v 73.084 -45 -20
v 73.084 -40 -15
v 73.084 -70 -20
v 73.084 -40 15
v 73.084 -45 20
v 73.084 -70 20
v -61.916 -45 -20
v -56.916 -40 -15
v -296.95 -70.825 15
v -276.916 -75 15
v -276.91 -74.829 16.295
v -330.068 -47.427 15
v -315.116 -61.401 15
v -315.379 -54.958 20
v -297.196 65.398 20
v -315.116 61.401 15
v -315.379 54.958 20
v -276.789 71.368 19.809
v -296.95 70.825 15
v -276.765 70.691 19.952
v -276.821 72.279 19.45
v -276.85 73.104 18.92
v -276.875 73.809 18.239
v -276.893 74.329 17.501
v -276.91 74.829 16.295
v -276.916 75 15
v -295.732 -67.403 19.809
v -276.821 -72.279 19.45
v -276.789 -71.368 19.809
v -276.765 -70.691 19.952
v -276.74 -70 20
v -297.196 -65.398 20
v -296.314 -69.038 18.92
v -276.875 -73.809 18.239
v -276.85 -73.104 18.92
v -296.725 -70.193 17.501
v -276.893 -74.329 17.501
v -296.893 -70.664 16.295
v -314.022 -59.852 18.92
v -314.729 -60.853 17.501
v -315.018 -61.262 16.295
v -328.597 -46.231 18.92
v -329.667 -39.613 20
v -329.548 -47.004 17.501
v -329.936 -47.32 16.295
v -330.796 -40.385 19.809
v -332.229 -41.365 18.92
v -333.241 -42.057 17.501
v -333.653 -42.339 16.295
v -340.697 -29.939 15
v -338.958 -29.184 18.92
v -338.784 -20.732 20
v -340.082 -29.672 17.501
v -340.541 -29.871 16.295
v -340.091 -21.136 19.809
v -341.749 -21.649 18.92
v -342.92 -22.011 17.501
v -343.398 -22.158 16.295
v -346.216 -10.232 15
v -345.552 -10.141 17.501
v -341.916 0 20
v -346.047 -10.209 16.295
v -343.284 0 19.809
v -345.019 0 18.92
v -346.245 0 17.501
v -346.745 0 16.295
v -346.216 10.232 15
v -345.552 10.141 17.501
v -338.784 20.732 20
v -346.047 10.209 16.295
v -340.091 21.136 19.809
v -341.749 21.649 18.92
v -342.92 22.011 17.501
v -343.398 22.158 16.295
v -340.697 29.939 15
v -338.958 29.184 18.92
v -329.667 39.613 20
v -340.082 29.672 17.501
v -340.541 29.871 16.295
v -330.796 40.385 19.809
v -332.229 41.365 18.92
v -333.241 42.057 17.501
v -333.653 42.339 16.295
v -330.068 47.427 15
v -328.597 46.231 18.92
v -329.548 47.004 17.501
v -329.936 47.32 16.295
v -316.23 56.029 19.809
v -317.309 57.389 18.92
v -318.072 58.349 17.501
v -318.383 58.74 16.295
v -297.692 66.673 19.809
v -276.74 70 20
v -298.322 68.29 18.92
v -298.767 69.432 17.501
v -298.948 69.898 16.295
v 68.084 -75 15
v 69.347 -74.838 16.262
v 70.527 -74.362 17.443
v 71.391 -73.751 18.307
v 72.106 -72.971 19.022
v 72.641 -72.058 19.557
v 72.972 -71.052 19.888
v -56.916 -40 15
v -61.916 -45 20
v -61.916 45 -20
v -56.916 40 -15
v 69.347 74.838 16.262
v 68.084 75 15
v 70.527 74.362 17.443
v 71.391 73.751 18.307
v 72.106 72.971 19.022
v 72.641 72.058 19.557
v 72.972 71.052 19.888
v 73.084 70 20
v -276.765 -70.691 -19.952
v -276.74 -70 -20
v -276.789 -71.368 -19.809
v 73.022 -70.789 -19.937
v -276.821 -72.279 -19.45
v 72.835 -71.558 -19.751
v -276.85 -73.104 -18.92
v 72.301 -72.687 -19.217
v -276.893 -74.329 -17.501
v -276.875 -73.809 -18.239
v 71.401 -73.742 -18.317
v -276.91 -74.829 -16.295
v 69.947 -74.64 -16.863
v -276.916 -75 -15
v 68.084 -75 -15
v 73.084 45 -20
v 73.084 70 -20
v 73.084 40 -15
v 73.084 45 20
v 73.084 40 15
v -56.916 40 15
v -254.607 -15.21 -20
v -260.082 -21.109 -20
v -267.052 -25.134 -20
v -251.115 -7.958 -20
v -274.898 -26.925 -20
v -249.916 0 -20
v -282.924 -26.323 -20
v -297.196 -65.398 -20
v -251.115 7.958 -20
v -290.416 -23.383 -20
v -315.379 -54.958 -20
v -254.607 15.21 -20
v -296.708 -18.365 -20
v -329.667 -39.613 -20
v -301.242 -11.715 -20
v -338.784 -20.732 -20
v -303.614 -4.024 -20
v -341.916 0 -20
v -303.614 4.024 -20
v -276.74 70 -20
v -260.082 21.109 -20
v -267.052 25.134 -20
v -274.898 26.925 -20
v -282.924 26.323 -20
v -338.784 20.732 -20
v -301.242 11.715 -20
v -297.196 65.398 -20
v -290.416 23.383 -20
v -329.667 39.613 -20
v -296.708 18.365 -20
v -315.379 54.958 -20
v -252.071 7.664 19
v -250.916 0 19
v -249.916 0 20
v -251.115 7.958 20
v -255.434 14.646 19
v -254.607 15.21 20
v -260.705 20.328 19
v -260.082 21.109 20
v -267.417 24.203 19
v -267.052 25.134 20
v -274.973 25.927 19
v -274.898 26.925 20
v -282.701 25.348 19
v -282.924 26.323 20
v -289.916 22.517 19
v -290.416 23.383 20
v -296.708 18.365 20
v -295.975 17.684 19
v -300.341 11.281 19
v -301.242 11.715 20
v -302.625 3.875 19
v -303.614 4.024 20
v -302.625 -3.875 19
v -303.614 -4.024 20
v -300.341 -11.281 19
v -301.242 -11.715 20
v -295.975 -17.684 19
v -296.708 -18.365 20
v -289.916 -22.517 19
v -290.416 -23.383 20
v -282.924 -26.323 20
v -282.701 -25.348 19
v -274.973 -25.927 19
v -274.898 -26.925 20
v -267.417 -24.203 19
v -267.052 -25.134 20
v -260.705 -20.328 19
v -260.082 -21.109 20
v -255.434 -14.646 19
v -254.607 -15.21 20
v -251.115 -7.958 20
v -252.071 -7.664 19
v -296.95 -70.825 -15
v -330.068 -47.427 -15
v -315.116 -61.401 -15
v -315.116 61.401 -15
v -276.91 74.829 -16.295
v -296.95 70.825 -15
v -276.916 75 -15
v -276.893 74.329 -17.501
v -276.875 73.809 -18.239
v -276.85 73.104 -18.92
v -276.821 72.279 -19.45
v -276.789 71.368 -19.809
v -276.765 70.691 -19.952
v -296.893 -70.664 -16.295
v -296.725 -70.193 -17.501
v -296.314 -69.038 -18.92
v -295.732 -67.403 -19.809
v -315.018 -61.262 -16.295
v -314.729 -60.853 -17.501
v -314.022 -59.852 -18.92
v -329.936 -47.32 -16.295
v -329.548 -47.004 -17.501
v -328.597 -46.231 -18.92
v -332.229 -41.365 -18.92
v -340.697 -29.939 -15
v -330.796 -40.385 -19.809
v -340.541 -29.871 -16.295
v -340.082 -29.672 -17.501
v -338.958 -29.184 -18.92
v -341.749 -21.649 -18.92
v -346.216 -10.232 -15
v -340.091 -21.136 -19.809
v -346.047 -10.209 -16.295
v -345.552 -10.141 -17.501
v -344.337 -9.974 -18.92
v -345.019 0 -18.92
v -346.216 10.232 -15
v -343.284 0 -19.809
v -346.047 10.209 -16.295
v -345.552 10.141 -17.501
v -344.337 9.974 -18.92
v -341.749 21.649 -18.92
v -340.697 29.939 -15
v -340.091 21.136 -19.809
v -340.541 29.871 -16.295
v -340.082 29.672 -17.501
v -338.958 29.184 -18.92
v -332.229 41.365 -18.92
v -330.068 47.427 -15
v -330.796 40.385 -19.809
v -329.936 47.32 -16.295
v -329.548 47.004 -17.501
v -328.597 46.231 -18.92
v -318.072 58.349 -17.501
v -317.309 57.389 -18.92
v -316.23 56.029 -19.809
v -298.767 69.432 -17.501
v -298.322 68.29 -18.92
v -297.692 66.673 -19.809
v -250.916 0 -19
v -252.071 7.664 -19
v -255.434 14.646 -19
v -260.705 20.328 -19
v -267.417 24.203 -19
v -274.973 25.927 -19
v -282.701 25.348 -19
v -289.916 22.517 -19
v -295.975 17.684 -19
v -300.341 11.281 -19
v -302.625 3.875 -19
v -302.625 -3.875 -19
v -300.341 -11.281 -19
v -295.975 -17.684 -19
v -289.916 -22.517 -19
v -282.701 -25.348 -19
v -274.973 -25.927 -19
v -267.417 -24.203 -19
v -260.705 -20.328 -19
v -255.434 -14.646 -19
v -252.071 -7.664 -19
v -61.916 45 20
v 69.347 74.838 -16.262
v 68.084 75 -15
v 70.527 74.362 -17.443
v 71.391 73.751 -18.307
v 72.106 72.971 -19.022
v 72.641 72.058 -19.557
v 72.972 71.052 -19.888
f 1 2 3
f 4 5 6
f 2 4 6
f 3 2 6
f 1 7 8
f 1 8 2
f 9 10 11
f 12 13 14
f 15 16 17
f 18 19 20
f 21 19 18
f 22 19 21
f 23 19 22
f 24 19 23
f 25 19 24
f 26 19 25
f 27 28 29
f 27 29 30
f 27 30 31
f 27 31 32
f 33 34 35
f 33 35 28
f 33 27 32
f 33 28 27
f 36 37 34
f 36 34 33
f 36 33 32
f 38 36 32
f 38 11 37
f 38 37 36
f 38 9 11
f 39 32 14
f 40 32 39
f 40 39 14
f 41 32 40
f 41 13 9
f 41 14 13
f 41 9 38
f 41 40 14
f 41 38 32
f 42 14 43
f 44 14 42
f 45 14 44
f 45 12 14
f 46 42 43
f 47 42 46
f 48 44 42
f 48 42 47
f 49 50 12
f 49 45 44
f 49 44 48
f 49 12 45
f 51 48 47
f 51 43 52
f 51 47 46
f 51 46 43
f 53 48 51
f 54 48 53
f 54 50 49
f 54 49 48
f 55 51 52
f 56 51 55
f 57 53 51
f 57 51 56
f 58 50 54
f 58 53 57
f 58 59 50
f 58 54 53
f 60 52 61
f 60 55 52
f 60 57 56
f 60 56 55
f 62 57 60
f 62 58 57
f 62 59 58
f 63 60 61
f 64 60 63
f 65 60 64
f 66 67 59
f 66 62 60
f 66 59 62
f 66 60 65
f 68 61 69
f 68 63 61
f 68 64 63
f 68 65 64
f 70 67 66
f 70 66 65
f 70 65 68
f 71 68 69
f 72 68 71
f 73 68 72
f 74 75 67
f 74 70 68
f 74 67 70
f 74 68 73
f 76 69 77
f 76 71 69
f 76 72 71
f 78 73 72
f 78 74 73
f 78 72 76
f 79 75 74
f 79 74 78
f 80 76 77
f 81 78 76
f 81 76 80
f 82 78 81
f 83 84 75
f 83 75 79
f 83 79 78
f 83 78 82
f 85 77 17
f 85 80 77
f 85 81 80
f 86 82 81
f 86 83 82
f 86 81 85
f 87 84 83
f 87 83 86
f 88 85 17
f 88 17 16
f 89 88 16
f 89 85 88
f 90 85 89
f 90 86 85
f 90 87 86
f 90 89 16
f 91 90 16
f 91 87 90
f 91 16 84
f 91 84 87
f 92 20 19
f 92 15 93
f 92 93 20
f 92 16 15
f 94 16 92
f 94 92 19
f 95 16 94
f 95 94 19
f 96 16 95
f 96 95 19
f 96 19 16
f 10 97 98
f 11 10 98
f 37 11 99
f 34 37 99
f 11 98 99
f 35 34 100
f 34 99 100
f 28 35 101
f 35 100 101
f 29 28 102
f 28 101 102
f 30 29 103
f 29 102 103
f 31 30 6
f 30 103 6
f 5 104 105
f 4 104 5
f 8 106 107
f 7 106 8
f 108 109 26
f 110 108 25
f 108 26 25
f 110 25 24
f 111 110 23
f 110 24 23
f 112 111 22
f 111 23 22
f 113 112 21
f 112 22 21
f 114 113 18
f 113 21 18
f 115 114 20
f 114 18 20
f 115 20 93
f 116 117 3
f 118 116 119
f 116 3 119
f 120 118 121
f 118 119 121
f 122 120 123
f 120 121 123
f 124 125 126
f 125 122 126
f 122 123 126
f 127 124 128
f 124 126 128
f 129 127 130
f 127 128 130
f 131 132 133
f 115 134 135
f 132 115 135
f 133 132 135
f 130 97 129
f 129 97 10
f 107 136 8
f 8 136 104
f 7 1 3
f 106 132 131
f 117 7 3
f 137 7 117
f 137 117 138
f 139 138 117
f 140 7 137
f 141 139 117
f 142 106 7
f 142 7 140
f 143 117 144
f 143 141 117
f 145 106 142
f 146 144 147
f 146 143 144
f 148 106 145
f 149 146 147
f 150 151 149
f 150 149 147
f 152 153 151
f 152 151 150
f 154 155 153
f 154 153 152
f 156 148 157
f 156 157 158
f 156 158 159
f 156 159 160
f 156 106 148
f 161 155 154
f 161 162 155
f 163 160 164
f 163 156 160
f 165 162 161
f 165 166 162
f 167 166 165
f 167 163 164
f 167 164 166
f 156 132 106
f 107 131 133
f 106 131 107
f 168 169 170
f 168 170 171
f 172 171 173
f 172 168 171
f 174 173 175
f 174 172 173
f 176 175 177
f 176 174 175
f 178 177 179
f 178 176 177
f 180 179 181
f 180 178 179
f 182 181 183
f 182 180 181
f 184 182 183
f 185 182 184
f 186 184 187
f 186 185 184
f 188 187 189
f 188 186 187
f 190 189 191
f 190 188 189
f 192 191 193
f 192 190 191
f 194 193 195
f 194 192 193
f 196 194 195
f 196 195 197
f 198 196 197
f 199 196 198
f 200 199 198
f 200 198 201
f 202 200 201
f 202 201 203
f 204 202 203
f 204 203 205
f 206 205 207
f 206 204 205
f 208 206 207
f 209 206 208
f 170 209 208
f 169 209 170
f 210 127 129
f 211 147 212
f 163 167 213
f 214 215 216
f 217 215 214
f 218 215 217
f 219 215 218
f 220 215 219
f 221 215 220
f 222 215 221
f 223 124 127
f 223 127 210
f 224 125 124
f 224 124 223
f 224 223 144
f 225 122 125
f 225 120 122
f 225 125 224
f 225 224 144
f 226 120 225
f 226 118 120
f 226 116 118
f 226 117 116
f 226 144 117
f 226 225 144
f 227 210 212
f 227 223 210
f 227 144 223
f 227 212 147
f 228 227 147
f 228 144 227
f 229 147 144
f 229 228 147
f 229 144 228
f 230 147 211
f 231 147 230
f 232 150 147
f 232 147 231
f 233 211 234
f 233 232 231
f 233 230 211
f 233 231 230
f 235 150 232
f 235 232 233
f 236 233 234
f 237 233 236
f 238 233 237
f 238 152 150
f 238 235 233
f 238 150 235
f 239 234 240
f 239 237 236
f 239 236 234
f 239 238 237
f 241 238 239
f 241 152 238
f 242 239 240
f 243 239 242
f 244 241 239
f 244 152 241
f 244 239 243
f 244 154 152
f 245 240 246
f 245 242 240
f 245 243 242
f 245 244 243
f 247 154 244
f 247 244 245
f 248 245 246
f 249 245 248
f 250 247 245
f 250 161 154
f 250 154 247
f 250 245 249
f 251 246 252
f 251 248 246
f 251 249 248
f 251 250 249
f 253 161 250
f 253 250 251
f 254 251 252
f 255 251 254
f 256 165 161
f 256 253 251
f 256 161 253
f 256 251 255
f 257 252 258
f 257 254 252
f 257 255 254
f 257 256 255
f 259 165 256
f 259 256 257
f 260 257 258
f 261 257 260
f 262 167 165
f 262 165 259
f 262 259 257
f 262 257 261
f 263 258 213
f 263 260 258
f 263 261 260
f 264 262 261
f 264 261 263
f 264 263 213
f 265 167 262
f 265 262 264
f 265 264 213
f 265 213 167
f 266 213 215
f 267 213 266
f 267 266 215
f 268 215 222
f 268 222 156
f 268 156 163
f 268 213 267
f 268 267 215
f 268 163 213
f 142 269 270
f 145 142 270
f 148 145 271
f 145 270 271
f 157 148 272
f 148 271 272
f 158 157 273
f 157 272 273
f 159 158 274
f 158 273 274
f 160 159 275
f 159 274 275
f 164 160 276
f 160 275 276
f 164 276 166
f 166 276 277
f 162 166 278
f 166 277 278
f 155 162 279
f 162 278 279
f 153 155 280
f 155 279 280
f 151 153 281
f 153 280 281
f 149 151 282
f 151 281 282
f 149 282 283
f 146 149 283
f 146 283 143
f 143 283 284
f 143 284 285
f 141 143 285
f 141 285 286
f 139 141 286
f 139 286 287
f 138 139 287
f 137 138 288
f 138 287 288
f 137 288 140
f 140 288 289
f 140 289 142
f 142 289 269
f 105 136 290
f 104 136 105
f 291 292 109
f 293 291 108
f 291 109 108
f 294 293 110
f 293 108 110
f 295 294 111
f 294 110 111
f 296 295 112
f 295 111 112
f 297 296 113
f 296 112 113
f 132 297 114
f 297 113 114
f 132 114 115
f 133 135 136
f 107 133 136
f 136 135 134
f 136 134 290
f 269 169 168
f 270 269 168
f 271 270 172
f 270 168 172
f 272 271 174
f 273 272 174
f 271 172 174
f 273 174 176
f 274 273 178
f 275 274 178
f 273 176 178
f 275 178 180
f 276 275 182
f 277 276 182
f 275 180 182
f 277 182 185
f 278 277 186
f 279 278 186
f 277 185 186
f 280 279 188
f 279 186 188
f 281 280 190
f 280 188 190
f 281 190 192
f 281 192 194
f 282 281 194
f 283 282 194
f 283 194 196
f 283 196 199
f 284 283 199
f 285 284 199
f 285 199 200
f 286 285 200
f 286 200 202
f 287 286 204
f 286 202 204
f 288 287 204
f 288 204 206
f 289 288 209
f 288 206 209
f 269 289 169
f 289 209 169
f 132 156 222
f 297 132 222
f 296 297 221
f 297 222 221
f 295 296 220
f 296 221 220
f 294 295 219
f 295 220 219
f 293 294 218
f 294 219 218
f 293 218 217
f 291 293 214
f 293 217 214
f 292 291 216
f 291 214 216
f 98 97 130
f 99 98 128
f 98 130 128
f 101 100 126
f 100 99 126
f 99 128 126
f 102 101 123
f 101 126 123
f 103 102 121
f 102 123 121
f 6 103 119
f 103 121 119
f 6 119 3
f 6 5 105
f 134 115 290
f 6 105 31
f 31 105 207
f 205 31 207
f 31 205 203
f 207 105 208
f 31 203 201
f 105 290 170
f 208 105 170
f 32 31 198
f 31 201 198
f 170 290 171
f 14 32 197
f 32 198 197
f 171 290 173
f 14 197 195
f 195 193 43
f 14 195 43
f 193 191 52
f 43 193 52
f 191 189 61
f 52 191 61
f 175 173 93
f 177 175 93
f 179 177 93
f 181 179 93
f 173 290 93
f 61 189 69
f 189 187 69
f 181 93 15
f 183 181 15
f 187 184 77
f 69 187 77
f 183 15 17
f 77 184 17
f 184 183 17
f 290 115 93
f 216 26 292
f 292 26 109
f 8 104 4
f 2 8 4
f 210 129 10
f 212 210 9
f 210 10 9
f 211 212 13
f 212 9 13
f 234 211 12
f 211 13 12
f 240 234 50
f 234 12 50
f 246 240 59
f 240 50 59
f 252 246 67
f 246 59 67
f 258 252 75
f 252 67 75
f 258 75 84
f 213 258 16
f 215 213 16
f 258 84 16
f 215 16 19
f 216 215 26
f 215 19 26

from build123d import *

# Parameters (mm, degrees)
BOSS_EXTRUDE1_DEPTH = 20
SKETCH2_R           = 26
CUT_EXTRUDE1_DEPTH  = 40
FILLET1_R           = 5
CHAMFER1_SIZE       = 1
CHAMFER2_SIZE       = 5


with BuildPart() as part:
    # Sketch1 → Boss-Extrude1 (new, symmetric)
    with BuildSketch(Plane.XY):
        with BuildLine():
            Line((-276.915792692, 75), (73.084207308, 75))
            Line((73.084207308, 75), (73.084207308, 40))
            Line((73.084207308, 40), (-56.915792692, 40))
            Line((-56.915792692, 40), (-56.915792692, -40))
            Line((-56.915792692, -40), (73.084207308, -40))
            Line((73.084207308, -40), (73.084207308, -75))
            Line((73.084207308, -75), (-276.915792692, -75))
            ThreePointArc((-276.915792692, -75), (-346.915792692, 0), (-276.915792692, 75))
        make_face()
    extrude(amount=BOSS_EXTRUDE1_DEPTH, both=True)

    # Sketch2 → Cut-Extrude1 (cut)
    with BuildSketch(Plane.XY.offset(20)):
        with Locations((-276.915792692, 0)):
            Circle(SKETCH2_R)
    extrude(amount=-CUT_EXTRUDE1_DEPTH, mode=Mode.SUBTRACT)

    # Fillet1
    # the kernel refuses this fillet: 5 mm, written as the material it takes off along each edge
    with BuildSketch(Plane(origin=(78.084207308, -75, -20), x_dir=(0, 1, 0), z_dir=(-1, 0, 0)), Plane(origin=(-281.915792692, 75, 20), x_dir=(0, 0, -1), z_dir=(1, 0, 0))) as fillet1_piece_1:
        with BuildLine():
            CenterArc((FILLET1_R, -FILLET1_R), FILLET1_R, 90, 90)
            Line((0, -FILLET1_R), (-FILLET1_R * 0.02, -FILLET1_R))
            Line((-FILLET1_R * 0.02, -FILLET1_R), (-FILLET1_R * 0.02, FILLET1_R * 0.02))
            Line((-FILLET1_R * 0.02, FILLET1_R * 0.02), (FILLET1_R, FILLET1_R * 0.02))
            Line((FILLET1_R, FILLET1_R * 0.02), (FILLET1_R, 0))
        make_face()
    extrude(amount=360, mode=Mode.SUBTRACT)
    with BuildSketch(Plane(origin=(-271.737221263, 0, -20), x_dir=(-0.00233212005306246, -0.9999972806043315, 0), z_dir=(0.9999972806043315, -0.00233212005306246, 0))) as fillet1_piece_2:
        with BuildLine():
            CenterArc((75.178571429 - FILLET1_R, -FILLET1_R), FILLET1_R, 0, 90)
            Line((75.178571429 - FILLET1_R, 0), (75.178571429 - FILLET1_R, FILLET1_R * 0.02))
            Line((75.178571429 - FILLET1_R, FILLET1_R * 0.02), (75.178571429 + FILLET1_R * 0.02, FILLET1_R * 0.02))
            Line((75.178571429 + FILLET1_R * 0.02, FILLET1_R * 0.02), (75.178571429 + FILLET1_R * 0.02, -FILLET1_R))
            Line((75.178571429 + FILLET1_R * 0.02, -FILLET1_R), (75.178571429, -FILLET1_R))
        make_face()
    revolve(axis=Axis((-271.737221263, 0, -20), (0, 0, -1)), revolution_arc=179.732758485, mode=Mode.SUBTRACT)
    with BuildSketch(Plane(origin=(73.084207308, 75, 25), x_dir=(-1, 0, 0), z_dir=(0, 0, -1)), Plane(origin=(73.084207308, -75, -25), x_dir=(-1, 0, 0), z_dir=(0, 0, 1))) as fillet1_piece_3:
        with BuildLine():
            CenterArc((FILLET1_R, -FILLET1_R), FILLET1_R, 90, 90)
            Line((0, -FILLET1_R), (-FILLET1_R * 0.02, -FILLET1_R))
            Line((-FILLET1_R * 0.02, -FILLET1_R), (-FILLET1_R * 0.02, FILLET1_R * 0.02))
            Line((-FILLET1_R * 0.02, FILLET1_R * 0.02), (FILLET1_R, FILLET1_R * 0.02))
            Line((FILLET1_R, FILLET1_R * 0.02), (FILLET1_R, 0))
        make_face()
    extrude(amount=50, mode=Mode.SUBTRACT)
    with BuildSketch(Plane(origin=(-271.737221263, 0, 20), x_dir=(-0.00233212005306246, -0.9999972806043315, 0), z_dir=(0.9999972806043315, -0.00233212005306246, 0))) as fillet1_piece_4:
        with BuildLine():
            CenterArc((75.178571429 - FILLET1_R, FILLET1_R), FILLET1_R, 270, 90)
            Line((75.178571429 - FILLET1_R, 0), (75.178571429 - FILLET1_R, -FILLET1_R * 0.02))
            Line((75.178571429 - FILLET1_R, -FILLET1_R * 0.02), (75.178571429 + FILLET1_R * 0.02, -FILLET1_R * 0.02))
            Line((75.178571429 + FILLET1_R * 0.02, -FILLET1_R * 0.02), (75.178571429 + FILLET1_R * 0.02, FILLET1_R))
            Line((75.178571429 + FILLET1_R * 0.02, FILLET1_R), (75.178571429, FILLET1_R))
        make_face()
    revolve(axis=Axis((-271.737221263, 0, 20), (0, 0, -1)), revolution_arc=179.732758485, mode=Mode.SUBTRACT)
    with BuildSketch(Plane(origin=(78.084207308, -75, 20), x_dir=(0, 1, 0), z_dir=(-1, 0, 0)), Plane(origin=(-281.915792692, 75, -20), x_dir=(0, 0, 1), z_dir=(1, 0, 0))) as fillet1_piece_5:
        with BuildLine():
            CenterArc((FILLET1_R, FILLET1_R), FILLET1_R, 180, 90)
            Line((0, FILLET1_R), (-FILLET1_R * 0.02, FILLET1_R))
            Line((-FILLET1_R * 0.02, FILLET1_R), (-FILLET1_R * 0.02, -FILLET1_R * 0.02))
            Line((-FILLET1_R * 0.02, -FILLET1_R * 0.02), (FILLET1_R, -FILLET1_R * 0.02))
            Line((FILLET1_R, -FILLET1_R * 0.02), (FILLET1_R, 0))
        make_face()
    extrude(amount=360, mode=Mode.SUBTRACT)

    # Chamfer1
    chamfer1_edges = [part.edges().sort_by_distance(p)[0] for p in [
        (-302.915792692, 0, -20),
        (-302.915792692, 0, 20),
    ]]
    chamfer(chamfer1_edges, length=CHAMFER1_SIZE)

    # Chamfer2
    chamfer2_edges = [part.edges().sort_by_distance(p)[0] for p in [
        (8.084207308, -40, 20),
        (-56.915792692, 0, 20),
        (8.084207308, 40, 20),
        (8.084207308, 40, -20),
        (-56.915792692, 0, -20),
        (8.084207308, -40, -20),
    ]]
    chamfer(chamfer2_edges, length=CHAMFER2_SIZE)


solid = part.part
